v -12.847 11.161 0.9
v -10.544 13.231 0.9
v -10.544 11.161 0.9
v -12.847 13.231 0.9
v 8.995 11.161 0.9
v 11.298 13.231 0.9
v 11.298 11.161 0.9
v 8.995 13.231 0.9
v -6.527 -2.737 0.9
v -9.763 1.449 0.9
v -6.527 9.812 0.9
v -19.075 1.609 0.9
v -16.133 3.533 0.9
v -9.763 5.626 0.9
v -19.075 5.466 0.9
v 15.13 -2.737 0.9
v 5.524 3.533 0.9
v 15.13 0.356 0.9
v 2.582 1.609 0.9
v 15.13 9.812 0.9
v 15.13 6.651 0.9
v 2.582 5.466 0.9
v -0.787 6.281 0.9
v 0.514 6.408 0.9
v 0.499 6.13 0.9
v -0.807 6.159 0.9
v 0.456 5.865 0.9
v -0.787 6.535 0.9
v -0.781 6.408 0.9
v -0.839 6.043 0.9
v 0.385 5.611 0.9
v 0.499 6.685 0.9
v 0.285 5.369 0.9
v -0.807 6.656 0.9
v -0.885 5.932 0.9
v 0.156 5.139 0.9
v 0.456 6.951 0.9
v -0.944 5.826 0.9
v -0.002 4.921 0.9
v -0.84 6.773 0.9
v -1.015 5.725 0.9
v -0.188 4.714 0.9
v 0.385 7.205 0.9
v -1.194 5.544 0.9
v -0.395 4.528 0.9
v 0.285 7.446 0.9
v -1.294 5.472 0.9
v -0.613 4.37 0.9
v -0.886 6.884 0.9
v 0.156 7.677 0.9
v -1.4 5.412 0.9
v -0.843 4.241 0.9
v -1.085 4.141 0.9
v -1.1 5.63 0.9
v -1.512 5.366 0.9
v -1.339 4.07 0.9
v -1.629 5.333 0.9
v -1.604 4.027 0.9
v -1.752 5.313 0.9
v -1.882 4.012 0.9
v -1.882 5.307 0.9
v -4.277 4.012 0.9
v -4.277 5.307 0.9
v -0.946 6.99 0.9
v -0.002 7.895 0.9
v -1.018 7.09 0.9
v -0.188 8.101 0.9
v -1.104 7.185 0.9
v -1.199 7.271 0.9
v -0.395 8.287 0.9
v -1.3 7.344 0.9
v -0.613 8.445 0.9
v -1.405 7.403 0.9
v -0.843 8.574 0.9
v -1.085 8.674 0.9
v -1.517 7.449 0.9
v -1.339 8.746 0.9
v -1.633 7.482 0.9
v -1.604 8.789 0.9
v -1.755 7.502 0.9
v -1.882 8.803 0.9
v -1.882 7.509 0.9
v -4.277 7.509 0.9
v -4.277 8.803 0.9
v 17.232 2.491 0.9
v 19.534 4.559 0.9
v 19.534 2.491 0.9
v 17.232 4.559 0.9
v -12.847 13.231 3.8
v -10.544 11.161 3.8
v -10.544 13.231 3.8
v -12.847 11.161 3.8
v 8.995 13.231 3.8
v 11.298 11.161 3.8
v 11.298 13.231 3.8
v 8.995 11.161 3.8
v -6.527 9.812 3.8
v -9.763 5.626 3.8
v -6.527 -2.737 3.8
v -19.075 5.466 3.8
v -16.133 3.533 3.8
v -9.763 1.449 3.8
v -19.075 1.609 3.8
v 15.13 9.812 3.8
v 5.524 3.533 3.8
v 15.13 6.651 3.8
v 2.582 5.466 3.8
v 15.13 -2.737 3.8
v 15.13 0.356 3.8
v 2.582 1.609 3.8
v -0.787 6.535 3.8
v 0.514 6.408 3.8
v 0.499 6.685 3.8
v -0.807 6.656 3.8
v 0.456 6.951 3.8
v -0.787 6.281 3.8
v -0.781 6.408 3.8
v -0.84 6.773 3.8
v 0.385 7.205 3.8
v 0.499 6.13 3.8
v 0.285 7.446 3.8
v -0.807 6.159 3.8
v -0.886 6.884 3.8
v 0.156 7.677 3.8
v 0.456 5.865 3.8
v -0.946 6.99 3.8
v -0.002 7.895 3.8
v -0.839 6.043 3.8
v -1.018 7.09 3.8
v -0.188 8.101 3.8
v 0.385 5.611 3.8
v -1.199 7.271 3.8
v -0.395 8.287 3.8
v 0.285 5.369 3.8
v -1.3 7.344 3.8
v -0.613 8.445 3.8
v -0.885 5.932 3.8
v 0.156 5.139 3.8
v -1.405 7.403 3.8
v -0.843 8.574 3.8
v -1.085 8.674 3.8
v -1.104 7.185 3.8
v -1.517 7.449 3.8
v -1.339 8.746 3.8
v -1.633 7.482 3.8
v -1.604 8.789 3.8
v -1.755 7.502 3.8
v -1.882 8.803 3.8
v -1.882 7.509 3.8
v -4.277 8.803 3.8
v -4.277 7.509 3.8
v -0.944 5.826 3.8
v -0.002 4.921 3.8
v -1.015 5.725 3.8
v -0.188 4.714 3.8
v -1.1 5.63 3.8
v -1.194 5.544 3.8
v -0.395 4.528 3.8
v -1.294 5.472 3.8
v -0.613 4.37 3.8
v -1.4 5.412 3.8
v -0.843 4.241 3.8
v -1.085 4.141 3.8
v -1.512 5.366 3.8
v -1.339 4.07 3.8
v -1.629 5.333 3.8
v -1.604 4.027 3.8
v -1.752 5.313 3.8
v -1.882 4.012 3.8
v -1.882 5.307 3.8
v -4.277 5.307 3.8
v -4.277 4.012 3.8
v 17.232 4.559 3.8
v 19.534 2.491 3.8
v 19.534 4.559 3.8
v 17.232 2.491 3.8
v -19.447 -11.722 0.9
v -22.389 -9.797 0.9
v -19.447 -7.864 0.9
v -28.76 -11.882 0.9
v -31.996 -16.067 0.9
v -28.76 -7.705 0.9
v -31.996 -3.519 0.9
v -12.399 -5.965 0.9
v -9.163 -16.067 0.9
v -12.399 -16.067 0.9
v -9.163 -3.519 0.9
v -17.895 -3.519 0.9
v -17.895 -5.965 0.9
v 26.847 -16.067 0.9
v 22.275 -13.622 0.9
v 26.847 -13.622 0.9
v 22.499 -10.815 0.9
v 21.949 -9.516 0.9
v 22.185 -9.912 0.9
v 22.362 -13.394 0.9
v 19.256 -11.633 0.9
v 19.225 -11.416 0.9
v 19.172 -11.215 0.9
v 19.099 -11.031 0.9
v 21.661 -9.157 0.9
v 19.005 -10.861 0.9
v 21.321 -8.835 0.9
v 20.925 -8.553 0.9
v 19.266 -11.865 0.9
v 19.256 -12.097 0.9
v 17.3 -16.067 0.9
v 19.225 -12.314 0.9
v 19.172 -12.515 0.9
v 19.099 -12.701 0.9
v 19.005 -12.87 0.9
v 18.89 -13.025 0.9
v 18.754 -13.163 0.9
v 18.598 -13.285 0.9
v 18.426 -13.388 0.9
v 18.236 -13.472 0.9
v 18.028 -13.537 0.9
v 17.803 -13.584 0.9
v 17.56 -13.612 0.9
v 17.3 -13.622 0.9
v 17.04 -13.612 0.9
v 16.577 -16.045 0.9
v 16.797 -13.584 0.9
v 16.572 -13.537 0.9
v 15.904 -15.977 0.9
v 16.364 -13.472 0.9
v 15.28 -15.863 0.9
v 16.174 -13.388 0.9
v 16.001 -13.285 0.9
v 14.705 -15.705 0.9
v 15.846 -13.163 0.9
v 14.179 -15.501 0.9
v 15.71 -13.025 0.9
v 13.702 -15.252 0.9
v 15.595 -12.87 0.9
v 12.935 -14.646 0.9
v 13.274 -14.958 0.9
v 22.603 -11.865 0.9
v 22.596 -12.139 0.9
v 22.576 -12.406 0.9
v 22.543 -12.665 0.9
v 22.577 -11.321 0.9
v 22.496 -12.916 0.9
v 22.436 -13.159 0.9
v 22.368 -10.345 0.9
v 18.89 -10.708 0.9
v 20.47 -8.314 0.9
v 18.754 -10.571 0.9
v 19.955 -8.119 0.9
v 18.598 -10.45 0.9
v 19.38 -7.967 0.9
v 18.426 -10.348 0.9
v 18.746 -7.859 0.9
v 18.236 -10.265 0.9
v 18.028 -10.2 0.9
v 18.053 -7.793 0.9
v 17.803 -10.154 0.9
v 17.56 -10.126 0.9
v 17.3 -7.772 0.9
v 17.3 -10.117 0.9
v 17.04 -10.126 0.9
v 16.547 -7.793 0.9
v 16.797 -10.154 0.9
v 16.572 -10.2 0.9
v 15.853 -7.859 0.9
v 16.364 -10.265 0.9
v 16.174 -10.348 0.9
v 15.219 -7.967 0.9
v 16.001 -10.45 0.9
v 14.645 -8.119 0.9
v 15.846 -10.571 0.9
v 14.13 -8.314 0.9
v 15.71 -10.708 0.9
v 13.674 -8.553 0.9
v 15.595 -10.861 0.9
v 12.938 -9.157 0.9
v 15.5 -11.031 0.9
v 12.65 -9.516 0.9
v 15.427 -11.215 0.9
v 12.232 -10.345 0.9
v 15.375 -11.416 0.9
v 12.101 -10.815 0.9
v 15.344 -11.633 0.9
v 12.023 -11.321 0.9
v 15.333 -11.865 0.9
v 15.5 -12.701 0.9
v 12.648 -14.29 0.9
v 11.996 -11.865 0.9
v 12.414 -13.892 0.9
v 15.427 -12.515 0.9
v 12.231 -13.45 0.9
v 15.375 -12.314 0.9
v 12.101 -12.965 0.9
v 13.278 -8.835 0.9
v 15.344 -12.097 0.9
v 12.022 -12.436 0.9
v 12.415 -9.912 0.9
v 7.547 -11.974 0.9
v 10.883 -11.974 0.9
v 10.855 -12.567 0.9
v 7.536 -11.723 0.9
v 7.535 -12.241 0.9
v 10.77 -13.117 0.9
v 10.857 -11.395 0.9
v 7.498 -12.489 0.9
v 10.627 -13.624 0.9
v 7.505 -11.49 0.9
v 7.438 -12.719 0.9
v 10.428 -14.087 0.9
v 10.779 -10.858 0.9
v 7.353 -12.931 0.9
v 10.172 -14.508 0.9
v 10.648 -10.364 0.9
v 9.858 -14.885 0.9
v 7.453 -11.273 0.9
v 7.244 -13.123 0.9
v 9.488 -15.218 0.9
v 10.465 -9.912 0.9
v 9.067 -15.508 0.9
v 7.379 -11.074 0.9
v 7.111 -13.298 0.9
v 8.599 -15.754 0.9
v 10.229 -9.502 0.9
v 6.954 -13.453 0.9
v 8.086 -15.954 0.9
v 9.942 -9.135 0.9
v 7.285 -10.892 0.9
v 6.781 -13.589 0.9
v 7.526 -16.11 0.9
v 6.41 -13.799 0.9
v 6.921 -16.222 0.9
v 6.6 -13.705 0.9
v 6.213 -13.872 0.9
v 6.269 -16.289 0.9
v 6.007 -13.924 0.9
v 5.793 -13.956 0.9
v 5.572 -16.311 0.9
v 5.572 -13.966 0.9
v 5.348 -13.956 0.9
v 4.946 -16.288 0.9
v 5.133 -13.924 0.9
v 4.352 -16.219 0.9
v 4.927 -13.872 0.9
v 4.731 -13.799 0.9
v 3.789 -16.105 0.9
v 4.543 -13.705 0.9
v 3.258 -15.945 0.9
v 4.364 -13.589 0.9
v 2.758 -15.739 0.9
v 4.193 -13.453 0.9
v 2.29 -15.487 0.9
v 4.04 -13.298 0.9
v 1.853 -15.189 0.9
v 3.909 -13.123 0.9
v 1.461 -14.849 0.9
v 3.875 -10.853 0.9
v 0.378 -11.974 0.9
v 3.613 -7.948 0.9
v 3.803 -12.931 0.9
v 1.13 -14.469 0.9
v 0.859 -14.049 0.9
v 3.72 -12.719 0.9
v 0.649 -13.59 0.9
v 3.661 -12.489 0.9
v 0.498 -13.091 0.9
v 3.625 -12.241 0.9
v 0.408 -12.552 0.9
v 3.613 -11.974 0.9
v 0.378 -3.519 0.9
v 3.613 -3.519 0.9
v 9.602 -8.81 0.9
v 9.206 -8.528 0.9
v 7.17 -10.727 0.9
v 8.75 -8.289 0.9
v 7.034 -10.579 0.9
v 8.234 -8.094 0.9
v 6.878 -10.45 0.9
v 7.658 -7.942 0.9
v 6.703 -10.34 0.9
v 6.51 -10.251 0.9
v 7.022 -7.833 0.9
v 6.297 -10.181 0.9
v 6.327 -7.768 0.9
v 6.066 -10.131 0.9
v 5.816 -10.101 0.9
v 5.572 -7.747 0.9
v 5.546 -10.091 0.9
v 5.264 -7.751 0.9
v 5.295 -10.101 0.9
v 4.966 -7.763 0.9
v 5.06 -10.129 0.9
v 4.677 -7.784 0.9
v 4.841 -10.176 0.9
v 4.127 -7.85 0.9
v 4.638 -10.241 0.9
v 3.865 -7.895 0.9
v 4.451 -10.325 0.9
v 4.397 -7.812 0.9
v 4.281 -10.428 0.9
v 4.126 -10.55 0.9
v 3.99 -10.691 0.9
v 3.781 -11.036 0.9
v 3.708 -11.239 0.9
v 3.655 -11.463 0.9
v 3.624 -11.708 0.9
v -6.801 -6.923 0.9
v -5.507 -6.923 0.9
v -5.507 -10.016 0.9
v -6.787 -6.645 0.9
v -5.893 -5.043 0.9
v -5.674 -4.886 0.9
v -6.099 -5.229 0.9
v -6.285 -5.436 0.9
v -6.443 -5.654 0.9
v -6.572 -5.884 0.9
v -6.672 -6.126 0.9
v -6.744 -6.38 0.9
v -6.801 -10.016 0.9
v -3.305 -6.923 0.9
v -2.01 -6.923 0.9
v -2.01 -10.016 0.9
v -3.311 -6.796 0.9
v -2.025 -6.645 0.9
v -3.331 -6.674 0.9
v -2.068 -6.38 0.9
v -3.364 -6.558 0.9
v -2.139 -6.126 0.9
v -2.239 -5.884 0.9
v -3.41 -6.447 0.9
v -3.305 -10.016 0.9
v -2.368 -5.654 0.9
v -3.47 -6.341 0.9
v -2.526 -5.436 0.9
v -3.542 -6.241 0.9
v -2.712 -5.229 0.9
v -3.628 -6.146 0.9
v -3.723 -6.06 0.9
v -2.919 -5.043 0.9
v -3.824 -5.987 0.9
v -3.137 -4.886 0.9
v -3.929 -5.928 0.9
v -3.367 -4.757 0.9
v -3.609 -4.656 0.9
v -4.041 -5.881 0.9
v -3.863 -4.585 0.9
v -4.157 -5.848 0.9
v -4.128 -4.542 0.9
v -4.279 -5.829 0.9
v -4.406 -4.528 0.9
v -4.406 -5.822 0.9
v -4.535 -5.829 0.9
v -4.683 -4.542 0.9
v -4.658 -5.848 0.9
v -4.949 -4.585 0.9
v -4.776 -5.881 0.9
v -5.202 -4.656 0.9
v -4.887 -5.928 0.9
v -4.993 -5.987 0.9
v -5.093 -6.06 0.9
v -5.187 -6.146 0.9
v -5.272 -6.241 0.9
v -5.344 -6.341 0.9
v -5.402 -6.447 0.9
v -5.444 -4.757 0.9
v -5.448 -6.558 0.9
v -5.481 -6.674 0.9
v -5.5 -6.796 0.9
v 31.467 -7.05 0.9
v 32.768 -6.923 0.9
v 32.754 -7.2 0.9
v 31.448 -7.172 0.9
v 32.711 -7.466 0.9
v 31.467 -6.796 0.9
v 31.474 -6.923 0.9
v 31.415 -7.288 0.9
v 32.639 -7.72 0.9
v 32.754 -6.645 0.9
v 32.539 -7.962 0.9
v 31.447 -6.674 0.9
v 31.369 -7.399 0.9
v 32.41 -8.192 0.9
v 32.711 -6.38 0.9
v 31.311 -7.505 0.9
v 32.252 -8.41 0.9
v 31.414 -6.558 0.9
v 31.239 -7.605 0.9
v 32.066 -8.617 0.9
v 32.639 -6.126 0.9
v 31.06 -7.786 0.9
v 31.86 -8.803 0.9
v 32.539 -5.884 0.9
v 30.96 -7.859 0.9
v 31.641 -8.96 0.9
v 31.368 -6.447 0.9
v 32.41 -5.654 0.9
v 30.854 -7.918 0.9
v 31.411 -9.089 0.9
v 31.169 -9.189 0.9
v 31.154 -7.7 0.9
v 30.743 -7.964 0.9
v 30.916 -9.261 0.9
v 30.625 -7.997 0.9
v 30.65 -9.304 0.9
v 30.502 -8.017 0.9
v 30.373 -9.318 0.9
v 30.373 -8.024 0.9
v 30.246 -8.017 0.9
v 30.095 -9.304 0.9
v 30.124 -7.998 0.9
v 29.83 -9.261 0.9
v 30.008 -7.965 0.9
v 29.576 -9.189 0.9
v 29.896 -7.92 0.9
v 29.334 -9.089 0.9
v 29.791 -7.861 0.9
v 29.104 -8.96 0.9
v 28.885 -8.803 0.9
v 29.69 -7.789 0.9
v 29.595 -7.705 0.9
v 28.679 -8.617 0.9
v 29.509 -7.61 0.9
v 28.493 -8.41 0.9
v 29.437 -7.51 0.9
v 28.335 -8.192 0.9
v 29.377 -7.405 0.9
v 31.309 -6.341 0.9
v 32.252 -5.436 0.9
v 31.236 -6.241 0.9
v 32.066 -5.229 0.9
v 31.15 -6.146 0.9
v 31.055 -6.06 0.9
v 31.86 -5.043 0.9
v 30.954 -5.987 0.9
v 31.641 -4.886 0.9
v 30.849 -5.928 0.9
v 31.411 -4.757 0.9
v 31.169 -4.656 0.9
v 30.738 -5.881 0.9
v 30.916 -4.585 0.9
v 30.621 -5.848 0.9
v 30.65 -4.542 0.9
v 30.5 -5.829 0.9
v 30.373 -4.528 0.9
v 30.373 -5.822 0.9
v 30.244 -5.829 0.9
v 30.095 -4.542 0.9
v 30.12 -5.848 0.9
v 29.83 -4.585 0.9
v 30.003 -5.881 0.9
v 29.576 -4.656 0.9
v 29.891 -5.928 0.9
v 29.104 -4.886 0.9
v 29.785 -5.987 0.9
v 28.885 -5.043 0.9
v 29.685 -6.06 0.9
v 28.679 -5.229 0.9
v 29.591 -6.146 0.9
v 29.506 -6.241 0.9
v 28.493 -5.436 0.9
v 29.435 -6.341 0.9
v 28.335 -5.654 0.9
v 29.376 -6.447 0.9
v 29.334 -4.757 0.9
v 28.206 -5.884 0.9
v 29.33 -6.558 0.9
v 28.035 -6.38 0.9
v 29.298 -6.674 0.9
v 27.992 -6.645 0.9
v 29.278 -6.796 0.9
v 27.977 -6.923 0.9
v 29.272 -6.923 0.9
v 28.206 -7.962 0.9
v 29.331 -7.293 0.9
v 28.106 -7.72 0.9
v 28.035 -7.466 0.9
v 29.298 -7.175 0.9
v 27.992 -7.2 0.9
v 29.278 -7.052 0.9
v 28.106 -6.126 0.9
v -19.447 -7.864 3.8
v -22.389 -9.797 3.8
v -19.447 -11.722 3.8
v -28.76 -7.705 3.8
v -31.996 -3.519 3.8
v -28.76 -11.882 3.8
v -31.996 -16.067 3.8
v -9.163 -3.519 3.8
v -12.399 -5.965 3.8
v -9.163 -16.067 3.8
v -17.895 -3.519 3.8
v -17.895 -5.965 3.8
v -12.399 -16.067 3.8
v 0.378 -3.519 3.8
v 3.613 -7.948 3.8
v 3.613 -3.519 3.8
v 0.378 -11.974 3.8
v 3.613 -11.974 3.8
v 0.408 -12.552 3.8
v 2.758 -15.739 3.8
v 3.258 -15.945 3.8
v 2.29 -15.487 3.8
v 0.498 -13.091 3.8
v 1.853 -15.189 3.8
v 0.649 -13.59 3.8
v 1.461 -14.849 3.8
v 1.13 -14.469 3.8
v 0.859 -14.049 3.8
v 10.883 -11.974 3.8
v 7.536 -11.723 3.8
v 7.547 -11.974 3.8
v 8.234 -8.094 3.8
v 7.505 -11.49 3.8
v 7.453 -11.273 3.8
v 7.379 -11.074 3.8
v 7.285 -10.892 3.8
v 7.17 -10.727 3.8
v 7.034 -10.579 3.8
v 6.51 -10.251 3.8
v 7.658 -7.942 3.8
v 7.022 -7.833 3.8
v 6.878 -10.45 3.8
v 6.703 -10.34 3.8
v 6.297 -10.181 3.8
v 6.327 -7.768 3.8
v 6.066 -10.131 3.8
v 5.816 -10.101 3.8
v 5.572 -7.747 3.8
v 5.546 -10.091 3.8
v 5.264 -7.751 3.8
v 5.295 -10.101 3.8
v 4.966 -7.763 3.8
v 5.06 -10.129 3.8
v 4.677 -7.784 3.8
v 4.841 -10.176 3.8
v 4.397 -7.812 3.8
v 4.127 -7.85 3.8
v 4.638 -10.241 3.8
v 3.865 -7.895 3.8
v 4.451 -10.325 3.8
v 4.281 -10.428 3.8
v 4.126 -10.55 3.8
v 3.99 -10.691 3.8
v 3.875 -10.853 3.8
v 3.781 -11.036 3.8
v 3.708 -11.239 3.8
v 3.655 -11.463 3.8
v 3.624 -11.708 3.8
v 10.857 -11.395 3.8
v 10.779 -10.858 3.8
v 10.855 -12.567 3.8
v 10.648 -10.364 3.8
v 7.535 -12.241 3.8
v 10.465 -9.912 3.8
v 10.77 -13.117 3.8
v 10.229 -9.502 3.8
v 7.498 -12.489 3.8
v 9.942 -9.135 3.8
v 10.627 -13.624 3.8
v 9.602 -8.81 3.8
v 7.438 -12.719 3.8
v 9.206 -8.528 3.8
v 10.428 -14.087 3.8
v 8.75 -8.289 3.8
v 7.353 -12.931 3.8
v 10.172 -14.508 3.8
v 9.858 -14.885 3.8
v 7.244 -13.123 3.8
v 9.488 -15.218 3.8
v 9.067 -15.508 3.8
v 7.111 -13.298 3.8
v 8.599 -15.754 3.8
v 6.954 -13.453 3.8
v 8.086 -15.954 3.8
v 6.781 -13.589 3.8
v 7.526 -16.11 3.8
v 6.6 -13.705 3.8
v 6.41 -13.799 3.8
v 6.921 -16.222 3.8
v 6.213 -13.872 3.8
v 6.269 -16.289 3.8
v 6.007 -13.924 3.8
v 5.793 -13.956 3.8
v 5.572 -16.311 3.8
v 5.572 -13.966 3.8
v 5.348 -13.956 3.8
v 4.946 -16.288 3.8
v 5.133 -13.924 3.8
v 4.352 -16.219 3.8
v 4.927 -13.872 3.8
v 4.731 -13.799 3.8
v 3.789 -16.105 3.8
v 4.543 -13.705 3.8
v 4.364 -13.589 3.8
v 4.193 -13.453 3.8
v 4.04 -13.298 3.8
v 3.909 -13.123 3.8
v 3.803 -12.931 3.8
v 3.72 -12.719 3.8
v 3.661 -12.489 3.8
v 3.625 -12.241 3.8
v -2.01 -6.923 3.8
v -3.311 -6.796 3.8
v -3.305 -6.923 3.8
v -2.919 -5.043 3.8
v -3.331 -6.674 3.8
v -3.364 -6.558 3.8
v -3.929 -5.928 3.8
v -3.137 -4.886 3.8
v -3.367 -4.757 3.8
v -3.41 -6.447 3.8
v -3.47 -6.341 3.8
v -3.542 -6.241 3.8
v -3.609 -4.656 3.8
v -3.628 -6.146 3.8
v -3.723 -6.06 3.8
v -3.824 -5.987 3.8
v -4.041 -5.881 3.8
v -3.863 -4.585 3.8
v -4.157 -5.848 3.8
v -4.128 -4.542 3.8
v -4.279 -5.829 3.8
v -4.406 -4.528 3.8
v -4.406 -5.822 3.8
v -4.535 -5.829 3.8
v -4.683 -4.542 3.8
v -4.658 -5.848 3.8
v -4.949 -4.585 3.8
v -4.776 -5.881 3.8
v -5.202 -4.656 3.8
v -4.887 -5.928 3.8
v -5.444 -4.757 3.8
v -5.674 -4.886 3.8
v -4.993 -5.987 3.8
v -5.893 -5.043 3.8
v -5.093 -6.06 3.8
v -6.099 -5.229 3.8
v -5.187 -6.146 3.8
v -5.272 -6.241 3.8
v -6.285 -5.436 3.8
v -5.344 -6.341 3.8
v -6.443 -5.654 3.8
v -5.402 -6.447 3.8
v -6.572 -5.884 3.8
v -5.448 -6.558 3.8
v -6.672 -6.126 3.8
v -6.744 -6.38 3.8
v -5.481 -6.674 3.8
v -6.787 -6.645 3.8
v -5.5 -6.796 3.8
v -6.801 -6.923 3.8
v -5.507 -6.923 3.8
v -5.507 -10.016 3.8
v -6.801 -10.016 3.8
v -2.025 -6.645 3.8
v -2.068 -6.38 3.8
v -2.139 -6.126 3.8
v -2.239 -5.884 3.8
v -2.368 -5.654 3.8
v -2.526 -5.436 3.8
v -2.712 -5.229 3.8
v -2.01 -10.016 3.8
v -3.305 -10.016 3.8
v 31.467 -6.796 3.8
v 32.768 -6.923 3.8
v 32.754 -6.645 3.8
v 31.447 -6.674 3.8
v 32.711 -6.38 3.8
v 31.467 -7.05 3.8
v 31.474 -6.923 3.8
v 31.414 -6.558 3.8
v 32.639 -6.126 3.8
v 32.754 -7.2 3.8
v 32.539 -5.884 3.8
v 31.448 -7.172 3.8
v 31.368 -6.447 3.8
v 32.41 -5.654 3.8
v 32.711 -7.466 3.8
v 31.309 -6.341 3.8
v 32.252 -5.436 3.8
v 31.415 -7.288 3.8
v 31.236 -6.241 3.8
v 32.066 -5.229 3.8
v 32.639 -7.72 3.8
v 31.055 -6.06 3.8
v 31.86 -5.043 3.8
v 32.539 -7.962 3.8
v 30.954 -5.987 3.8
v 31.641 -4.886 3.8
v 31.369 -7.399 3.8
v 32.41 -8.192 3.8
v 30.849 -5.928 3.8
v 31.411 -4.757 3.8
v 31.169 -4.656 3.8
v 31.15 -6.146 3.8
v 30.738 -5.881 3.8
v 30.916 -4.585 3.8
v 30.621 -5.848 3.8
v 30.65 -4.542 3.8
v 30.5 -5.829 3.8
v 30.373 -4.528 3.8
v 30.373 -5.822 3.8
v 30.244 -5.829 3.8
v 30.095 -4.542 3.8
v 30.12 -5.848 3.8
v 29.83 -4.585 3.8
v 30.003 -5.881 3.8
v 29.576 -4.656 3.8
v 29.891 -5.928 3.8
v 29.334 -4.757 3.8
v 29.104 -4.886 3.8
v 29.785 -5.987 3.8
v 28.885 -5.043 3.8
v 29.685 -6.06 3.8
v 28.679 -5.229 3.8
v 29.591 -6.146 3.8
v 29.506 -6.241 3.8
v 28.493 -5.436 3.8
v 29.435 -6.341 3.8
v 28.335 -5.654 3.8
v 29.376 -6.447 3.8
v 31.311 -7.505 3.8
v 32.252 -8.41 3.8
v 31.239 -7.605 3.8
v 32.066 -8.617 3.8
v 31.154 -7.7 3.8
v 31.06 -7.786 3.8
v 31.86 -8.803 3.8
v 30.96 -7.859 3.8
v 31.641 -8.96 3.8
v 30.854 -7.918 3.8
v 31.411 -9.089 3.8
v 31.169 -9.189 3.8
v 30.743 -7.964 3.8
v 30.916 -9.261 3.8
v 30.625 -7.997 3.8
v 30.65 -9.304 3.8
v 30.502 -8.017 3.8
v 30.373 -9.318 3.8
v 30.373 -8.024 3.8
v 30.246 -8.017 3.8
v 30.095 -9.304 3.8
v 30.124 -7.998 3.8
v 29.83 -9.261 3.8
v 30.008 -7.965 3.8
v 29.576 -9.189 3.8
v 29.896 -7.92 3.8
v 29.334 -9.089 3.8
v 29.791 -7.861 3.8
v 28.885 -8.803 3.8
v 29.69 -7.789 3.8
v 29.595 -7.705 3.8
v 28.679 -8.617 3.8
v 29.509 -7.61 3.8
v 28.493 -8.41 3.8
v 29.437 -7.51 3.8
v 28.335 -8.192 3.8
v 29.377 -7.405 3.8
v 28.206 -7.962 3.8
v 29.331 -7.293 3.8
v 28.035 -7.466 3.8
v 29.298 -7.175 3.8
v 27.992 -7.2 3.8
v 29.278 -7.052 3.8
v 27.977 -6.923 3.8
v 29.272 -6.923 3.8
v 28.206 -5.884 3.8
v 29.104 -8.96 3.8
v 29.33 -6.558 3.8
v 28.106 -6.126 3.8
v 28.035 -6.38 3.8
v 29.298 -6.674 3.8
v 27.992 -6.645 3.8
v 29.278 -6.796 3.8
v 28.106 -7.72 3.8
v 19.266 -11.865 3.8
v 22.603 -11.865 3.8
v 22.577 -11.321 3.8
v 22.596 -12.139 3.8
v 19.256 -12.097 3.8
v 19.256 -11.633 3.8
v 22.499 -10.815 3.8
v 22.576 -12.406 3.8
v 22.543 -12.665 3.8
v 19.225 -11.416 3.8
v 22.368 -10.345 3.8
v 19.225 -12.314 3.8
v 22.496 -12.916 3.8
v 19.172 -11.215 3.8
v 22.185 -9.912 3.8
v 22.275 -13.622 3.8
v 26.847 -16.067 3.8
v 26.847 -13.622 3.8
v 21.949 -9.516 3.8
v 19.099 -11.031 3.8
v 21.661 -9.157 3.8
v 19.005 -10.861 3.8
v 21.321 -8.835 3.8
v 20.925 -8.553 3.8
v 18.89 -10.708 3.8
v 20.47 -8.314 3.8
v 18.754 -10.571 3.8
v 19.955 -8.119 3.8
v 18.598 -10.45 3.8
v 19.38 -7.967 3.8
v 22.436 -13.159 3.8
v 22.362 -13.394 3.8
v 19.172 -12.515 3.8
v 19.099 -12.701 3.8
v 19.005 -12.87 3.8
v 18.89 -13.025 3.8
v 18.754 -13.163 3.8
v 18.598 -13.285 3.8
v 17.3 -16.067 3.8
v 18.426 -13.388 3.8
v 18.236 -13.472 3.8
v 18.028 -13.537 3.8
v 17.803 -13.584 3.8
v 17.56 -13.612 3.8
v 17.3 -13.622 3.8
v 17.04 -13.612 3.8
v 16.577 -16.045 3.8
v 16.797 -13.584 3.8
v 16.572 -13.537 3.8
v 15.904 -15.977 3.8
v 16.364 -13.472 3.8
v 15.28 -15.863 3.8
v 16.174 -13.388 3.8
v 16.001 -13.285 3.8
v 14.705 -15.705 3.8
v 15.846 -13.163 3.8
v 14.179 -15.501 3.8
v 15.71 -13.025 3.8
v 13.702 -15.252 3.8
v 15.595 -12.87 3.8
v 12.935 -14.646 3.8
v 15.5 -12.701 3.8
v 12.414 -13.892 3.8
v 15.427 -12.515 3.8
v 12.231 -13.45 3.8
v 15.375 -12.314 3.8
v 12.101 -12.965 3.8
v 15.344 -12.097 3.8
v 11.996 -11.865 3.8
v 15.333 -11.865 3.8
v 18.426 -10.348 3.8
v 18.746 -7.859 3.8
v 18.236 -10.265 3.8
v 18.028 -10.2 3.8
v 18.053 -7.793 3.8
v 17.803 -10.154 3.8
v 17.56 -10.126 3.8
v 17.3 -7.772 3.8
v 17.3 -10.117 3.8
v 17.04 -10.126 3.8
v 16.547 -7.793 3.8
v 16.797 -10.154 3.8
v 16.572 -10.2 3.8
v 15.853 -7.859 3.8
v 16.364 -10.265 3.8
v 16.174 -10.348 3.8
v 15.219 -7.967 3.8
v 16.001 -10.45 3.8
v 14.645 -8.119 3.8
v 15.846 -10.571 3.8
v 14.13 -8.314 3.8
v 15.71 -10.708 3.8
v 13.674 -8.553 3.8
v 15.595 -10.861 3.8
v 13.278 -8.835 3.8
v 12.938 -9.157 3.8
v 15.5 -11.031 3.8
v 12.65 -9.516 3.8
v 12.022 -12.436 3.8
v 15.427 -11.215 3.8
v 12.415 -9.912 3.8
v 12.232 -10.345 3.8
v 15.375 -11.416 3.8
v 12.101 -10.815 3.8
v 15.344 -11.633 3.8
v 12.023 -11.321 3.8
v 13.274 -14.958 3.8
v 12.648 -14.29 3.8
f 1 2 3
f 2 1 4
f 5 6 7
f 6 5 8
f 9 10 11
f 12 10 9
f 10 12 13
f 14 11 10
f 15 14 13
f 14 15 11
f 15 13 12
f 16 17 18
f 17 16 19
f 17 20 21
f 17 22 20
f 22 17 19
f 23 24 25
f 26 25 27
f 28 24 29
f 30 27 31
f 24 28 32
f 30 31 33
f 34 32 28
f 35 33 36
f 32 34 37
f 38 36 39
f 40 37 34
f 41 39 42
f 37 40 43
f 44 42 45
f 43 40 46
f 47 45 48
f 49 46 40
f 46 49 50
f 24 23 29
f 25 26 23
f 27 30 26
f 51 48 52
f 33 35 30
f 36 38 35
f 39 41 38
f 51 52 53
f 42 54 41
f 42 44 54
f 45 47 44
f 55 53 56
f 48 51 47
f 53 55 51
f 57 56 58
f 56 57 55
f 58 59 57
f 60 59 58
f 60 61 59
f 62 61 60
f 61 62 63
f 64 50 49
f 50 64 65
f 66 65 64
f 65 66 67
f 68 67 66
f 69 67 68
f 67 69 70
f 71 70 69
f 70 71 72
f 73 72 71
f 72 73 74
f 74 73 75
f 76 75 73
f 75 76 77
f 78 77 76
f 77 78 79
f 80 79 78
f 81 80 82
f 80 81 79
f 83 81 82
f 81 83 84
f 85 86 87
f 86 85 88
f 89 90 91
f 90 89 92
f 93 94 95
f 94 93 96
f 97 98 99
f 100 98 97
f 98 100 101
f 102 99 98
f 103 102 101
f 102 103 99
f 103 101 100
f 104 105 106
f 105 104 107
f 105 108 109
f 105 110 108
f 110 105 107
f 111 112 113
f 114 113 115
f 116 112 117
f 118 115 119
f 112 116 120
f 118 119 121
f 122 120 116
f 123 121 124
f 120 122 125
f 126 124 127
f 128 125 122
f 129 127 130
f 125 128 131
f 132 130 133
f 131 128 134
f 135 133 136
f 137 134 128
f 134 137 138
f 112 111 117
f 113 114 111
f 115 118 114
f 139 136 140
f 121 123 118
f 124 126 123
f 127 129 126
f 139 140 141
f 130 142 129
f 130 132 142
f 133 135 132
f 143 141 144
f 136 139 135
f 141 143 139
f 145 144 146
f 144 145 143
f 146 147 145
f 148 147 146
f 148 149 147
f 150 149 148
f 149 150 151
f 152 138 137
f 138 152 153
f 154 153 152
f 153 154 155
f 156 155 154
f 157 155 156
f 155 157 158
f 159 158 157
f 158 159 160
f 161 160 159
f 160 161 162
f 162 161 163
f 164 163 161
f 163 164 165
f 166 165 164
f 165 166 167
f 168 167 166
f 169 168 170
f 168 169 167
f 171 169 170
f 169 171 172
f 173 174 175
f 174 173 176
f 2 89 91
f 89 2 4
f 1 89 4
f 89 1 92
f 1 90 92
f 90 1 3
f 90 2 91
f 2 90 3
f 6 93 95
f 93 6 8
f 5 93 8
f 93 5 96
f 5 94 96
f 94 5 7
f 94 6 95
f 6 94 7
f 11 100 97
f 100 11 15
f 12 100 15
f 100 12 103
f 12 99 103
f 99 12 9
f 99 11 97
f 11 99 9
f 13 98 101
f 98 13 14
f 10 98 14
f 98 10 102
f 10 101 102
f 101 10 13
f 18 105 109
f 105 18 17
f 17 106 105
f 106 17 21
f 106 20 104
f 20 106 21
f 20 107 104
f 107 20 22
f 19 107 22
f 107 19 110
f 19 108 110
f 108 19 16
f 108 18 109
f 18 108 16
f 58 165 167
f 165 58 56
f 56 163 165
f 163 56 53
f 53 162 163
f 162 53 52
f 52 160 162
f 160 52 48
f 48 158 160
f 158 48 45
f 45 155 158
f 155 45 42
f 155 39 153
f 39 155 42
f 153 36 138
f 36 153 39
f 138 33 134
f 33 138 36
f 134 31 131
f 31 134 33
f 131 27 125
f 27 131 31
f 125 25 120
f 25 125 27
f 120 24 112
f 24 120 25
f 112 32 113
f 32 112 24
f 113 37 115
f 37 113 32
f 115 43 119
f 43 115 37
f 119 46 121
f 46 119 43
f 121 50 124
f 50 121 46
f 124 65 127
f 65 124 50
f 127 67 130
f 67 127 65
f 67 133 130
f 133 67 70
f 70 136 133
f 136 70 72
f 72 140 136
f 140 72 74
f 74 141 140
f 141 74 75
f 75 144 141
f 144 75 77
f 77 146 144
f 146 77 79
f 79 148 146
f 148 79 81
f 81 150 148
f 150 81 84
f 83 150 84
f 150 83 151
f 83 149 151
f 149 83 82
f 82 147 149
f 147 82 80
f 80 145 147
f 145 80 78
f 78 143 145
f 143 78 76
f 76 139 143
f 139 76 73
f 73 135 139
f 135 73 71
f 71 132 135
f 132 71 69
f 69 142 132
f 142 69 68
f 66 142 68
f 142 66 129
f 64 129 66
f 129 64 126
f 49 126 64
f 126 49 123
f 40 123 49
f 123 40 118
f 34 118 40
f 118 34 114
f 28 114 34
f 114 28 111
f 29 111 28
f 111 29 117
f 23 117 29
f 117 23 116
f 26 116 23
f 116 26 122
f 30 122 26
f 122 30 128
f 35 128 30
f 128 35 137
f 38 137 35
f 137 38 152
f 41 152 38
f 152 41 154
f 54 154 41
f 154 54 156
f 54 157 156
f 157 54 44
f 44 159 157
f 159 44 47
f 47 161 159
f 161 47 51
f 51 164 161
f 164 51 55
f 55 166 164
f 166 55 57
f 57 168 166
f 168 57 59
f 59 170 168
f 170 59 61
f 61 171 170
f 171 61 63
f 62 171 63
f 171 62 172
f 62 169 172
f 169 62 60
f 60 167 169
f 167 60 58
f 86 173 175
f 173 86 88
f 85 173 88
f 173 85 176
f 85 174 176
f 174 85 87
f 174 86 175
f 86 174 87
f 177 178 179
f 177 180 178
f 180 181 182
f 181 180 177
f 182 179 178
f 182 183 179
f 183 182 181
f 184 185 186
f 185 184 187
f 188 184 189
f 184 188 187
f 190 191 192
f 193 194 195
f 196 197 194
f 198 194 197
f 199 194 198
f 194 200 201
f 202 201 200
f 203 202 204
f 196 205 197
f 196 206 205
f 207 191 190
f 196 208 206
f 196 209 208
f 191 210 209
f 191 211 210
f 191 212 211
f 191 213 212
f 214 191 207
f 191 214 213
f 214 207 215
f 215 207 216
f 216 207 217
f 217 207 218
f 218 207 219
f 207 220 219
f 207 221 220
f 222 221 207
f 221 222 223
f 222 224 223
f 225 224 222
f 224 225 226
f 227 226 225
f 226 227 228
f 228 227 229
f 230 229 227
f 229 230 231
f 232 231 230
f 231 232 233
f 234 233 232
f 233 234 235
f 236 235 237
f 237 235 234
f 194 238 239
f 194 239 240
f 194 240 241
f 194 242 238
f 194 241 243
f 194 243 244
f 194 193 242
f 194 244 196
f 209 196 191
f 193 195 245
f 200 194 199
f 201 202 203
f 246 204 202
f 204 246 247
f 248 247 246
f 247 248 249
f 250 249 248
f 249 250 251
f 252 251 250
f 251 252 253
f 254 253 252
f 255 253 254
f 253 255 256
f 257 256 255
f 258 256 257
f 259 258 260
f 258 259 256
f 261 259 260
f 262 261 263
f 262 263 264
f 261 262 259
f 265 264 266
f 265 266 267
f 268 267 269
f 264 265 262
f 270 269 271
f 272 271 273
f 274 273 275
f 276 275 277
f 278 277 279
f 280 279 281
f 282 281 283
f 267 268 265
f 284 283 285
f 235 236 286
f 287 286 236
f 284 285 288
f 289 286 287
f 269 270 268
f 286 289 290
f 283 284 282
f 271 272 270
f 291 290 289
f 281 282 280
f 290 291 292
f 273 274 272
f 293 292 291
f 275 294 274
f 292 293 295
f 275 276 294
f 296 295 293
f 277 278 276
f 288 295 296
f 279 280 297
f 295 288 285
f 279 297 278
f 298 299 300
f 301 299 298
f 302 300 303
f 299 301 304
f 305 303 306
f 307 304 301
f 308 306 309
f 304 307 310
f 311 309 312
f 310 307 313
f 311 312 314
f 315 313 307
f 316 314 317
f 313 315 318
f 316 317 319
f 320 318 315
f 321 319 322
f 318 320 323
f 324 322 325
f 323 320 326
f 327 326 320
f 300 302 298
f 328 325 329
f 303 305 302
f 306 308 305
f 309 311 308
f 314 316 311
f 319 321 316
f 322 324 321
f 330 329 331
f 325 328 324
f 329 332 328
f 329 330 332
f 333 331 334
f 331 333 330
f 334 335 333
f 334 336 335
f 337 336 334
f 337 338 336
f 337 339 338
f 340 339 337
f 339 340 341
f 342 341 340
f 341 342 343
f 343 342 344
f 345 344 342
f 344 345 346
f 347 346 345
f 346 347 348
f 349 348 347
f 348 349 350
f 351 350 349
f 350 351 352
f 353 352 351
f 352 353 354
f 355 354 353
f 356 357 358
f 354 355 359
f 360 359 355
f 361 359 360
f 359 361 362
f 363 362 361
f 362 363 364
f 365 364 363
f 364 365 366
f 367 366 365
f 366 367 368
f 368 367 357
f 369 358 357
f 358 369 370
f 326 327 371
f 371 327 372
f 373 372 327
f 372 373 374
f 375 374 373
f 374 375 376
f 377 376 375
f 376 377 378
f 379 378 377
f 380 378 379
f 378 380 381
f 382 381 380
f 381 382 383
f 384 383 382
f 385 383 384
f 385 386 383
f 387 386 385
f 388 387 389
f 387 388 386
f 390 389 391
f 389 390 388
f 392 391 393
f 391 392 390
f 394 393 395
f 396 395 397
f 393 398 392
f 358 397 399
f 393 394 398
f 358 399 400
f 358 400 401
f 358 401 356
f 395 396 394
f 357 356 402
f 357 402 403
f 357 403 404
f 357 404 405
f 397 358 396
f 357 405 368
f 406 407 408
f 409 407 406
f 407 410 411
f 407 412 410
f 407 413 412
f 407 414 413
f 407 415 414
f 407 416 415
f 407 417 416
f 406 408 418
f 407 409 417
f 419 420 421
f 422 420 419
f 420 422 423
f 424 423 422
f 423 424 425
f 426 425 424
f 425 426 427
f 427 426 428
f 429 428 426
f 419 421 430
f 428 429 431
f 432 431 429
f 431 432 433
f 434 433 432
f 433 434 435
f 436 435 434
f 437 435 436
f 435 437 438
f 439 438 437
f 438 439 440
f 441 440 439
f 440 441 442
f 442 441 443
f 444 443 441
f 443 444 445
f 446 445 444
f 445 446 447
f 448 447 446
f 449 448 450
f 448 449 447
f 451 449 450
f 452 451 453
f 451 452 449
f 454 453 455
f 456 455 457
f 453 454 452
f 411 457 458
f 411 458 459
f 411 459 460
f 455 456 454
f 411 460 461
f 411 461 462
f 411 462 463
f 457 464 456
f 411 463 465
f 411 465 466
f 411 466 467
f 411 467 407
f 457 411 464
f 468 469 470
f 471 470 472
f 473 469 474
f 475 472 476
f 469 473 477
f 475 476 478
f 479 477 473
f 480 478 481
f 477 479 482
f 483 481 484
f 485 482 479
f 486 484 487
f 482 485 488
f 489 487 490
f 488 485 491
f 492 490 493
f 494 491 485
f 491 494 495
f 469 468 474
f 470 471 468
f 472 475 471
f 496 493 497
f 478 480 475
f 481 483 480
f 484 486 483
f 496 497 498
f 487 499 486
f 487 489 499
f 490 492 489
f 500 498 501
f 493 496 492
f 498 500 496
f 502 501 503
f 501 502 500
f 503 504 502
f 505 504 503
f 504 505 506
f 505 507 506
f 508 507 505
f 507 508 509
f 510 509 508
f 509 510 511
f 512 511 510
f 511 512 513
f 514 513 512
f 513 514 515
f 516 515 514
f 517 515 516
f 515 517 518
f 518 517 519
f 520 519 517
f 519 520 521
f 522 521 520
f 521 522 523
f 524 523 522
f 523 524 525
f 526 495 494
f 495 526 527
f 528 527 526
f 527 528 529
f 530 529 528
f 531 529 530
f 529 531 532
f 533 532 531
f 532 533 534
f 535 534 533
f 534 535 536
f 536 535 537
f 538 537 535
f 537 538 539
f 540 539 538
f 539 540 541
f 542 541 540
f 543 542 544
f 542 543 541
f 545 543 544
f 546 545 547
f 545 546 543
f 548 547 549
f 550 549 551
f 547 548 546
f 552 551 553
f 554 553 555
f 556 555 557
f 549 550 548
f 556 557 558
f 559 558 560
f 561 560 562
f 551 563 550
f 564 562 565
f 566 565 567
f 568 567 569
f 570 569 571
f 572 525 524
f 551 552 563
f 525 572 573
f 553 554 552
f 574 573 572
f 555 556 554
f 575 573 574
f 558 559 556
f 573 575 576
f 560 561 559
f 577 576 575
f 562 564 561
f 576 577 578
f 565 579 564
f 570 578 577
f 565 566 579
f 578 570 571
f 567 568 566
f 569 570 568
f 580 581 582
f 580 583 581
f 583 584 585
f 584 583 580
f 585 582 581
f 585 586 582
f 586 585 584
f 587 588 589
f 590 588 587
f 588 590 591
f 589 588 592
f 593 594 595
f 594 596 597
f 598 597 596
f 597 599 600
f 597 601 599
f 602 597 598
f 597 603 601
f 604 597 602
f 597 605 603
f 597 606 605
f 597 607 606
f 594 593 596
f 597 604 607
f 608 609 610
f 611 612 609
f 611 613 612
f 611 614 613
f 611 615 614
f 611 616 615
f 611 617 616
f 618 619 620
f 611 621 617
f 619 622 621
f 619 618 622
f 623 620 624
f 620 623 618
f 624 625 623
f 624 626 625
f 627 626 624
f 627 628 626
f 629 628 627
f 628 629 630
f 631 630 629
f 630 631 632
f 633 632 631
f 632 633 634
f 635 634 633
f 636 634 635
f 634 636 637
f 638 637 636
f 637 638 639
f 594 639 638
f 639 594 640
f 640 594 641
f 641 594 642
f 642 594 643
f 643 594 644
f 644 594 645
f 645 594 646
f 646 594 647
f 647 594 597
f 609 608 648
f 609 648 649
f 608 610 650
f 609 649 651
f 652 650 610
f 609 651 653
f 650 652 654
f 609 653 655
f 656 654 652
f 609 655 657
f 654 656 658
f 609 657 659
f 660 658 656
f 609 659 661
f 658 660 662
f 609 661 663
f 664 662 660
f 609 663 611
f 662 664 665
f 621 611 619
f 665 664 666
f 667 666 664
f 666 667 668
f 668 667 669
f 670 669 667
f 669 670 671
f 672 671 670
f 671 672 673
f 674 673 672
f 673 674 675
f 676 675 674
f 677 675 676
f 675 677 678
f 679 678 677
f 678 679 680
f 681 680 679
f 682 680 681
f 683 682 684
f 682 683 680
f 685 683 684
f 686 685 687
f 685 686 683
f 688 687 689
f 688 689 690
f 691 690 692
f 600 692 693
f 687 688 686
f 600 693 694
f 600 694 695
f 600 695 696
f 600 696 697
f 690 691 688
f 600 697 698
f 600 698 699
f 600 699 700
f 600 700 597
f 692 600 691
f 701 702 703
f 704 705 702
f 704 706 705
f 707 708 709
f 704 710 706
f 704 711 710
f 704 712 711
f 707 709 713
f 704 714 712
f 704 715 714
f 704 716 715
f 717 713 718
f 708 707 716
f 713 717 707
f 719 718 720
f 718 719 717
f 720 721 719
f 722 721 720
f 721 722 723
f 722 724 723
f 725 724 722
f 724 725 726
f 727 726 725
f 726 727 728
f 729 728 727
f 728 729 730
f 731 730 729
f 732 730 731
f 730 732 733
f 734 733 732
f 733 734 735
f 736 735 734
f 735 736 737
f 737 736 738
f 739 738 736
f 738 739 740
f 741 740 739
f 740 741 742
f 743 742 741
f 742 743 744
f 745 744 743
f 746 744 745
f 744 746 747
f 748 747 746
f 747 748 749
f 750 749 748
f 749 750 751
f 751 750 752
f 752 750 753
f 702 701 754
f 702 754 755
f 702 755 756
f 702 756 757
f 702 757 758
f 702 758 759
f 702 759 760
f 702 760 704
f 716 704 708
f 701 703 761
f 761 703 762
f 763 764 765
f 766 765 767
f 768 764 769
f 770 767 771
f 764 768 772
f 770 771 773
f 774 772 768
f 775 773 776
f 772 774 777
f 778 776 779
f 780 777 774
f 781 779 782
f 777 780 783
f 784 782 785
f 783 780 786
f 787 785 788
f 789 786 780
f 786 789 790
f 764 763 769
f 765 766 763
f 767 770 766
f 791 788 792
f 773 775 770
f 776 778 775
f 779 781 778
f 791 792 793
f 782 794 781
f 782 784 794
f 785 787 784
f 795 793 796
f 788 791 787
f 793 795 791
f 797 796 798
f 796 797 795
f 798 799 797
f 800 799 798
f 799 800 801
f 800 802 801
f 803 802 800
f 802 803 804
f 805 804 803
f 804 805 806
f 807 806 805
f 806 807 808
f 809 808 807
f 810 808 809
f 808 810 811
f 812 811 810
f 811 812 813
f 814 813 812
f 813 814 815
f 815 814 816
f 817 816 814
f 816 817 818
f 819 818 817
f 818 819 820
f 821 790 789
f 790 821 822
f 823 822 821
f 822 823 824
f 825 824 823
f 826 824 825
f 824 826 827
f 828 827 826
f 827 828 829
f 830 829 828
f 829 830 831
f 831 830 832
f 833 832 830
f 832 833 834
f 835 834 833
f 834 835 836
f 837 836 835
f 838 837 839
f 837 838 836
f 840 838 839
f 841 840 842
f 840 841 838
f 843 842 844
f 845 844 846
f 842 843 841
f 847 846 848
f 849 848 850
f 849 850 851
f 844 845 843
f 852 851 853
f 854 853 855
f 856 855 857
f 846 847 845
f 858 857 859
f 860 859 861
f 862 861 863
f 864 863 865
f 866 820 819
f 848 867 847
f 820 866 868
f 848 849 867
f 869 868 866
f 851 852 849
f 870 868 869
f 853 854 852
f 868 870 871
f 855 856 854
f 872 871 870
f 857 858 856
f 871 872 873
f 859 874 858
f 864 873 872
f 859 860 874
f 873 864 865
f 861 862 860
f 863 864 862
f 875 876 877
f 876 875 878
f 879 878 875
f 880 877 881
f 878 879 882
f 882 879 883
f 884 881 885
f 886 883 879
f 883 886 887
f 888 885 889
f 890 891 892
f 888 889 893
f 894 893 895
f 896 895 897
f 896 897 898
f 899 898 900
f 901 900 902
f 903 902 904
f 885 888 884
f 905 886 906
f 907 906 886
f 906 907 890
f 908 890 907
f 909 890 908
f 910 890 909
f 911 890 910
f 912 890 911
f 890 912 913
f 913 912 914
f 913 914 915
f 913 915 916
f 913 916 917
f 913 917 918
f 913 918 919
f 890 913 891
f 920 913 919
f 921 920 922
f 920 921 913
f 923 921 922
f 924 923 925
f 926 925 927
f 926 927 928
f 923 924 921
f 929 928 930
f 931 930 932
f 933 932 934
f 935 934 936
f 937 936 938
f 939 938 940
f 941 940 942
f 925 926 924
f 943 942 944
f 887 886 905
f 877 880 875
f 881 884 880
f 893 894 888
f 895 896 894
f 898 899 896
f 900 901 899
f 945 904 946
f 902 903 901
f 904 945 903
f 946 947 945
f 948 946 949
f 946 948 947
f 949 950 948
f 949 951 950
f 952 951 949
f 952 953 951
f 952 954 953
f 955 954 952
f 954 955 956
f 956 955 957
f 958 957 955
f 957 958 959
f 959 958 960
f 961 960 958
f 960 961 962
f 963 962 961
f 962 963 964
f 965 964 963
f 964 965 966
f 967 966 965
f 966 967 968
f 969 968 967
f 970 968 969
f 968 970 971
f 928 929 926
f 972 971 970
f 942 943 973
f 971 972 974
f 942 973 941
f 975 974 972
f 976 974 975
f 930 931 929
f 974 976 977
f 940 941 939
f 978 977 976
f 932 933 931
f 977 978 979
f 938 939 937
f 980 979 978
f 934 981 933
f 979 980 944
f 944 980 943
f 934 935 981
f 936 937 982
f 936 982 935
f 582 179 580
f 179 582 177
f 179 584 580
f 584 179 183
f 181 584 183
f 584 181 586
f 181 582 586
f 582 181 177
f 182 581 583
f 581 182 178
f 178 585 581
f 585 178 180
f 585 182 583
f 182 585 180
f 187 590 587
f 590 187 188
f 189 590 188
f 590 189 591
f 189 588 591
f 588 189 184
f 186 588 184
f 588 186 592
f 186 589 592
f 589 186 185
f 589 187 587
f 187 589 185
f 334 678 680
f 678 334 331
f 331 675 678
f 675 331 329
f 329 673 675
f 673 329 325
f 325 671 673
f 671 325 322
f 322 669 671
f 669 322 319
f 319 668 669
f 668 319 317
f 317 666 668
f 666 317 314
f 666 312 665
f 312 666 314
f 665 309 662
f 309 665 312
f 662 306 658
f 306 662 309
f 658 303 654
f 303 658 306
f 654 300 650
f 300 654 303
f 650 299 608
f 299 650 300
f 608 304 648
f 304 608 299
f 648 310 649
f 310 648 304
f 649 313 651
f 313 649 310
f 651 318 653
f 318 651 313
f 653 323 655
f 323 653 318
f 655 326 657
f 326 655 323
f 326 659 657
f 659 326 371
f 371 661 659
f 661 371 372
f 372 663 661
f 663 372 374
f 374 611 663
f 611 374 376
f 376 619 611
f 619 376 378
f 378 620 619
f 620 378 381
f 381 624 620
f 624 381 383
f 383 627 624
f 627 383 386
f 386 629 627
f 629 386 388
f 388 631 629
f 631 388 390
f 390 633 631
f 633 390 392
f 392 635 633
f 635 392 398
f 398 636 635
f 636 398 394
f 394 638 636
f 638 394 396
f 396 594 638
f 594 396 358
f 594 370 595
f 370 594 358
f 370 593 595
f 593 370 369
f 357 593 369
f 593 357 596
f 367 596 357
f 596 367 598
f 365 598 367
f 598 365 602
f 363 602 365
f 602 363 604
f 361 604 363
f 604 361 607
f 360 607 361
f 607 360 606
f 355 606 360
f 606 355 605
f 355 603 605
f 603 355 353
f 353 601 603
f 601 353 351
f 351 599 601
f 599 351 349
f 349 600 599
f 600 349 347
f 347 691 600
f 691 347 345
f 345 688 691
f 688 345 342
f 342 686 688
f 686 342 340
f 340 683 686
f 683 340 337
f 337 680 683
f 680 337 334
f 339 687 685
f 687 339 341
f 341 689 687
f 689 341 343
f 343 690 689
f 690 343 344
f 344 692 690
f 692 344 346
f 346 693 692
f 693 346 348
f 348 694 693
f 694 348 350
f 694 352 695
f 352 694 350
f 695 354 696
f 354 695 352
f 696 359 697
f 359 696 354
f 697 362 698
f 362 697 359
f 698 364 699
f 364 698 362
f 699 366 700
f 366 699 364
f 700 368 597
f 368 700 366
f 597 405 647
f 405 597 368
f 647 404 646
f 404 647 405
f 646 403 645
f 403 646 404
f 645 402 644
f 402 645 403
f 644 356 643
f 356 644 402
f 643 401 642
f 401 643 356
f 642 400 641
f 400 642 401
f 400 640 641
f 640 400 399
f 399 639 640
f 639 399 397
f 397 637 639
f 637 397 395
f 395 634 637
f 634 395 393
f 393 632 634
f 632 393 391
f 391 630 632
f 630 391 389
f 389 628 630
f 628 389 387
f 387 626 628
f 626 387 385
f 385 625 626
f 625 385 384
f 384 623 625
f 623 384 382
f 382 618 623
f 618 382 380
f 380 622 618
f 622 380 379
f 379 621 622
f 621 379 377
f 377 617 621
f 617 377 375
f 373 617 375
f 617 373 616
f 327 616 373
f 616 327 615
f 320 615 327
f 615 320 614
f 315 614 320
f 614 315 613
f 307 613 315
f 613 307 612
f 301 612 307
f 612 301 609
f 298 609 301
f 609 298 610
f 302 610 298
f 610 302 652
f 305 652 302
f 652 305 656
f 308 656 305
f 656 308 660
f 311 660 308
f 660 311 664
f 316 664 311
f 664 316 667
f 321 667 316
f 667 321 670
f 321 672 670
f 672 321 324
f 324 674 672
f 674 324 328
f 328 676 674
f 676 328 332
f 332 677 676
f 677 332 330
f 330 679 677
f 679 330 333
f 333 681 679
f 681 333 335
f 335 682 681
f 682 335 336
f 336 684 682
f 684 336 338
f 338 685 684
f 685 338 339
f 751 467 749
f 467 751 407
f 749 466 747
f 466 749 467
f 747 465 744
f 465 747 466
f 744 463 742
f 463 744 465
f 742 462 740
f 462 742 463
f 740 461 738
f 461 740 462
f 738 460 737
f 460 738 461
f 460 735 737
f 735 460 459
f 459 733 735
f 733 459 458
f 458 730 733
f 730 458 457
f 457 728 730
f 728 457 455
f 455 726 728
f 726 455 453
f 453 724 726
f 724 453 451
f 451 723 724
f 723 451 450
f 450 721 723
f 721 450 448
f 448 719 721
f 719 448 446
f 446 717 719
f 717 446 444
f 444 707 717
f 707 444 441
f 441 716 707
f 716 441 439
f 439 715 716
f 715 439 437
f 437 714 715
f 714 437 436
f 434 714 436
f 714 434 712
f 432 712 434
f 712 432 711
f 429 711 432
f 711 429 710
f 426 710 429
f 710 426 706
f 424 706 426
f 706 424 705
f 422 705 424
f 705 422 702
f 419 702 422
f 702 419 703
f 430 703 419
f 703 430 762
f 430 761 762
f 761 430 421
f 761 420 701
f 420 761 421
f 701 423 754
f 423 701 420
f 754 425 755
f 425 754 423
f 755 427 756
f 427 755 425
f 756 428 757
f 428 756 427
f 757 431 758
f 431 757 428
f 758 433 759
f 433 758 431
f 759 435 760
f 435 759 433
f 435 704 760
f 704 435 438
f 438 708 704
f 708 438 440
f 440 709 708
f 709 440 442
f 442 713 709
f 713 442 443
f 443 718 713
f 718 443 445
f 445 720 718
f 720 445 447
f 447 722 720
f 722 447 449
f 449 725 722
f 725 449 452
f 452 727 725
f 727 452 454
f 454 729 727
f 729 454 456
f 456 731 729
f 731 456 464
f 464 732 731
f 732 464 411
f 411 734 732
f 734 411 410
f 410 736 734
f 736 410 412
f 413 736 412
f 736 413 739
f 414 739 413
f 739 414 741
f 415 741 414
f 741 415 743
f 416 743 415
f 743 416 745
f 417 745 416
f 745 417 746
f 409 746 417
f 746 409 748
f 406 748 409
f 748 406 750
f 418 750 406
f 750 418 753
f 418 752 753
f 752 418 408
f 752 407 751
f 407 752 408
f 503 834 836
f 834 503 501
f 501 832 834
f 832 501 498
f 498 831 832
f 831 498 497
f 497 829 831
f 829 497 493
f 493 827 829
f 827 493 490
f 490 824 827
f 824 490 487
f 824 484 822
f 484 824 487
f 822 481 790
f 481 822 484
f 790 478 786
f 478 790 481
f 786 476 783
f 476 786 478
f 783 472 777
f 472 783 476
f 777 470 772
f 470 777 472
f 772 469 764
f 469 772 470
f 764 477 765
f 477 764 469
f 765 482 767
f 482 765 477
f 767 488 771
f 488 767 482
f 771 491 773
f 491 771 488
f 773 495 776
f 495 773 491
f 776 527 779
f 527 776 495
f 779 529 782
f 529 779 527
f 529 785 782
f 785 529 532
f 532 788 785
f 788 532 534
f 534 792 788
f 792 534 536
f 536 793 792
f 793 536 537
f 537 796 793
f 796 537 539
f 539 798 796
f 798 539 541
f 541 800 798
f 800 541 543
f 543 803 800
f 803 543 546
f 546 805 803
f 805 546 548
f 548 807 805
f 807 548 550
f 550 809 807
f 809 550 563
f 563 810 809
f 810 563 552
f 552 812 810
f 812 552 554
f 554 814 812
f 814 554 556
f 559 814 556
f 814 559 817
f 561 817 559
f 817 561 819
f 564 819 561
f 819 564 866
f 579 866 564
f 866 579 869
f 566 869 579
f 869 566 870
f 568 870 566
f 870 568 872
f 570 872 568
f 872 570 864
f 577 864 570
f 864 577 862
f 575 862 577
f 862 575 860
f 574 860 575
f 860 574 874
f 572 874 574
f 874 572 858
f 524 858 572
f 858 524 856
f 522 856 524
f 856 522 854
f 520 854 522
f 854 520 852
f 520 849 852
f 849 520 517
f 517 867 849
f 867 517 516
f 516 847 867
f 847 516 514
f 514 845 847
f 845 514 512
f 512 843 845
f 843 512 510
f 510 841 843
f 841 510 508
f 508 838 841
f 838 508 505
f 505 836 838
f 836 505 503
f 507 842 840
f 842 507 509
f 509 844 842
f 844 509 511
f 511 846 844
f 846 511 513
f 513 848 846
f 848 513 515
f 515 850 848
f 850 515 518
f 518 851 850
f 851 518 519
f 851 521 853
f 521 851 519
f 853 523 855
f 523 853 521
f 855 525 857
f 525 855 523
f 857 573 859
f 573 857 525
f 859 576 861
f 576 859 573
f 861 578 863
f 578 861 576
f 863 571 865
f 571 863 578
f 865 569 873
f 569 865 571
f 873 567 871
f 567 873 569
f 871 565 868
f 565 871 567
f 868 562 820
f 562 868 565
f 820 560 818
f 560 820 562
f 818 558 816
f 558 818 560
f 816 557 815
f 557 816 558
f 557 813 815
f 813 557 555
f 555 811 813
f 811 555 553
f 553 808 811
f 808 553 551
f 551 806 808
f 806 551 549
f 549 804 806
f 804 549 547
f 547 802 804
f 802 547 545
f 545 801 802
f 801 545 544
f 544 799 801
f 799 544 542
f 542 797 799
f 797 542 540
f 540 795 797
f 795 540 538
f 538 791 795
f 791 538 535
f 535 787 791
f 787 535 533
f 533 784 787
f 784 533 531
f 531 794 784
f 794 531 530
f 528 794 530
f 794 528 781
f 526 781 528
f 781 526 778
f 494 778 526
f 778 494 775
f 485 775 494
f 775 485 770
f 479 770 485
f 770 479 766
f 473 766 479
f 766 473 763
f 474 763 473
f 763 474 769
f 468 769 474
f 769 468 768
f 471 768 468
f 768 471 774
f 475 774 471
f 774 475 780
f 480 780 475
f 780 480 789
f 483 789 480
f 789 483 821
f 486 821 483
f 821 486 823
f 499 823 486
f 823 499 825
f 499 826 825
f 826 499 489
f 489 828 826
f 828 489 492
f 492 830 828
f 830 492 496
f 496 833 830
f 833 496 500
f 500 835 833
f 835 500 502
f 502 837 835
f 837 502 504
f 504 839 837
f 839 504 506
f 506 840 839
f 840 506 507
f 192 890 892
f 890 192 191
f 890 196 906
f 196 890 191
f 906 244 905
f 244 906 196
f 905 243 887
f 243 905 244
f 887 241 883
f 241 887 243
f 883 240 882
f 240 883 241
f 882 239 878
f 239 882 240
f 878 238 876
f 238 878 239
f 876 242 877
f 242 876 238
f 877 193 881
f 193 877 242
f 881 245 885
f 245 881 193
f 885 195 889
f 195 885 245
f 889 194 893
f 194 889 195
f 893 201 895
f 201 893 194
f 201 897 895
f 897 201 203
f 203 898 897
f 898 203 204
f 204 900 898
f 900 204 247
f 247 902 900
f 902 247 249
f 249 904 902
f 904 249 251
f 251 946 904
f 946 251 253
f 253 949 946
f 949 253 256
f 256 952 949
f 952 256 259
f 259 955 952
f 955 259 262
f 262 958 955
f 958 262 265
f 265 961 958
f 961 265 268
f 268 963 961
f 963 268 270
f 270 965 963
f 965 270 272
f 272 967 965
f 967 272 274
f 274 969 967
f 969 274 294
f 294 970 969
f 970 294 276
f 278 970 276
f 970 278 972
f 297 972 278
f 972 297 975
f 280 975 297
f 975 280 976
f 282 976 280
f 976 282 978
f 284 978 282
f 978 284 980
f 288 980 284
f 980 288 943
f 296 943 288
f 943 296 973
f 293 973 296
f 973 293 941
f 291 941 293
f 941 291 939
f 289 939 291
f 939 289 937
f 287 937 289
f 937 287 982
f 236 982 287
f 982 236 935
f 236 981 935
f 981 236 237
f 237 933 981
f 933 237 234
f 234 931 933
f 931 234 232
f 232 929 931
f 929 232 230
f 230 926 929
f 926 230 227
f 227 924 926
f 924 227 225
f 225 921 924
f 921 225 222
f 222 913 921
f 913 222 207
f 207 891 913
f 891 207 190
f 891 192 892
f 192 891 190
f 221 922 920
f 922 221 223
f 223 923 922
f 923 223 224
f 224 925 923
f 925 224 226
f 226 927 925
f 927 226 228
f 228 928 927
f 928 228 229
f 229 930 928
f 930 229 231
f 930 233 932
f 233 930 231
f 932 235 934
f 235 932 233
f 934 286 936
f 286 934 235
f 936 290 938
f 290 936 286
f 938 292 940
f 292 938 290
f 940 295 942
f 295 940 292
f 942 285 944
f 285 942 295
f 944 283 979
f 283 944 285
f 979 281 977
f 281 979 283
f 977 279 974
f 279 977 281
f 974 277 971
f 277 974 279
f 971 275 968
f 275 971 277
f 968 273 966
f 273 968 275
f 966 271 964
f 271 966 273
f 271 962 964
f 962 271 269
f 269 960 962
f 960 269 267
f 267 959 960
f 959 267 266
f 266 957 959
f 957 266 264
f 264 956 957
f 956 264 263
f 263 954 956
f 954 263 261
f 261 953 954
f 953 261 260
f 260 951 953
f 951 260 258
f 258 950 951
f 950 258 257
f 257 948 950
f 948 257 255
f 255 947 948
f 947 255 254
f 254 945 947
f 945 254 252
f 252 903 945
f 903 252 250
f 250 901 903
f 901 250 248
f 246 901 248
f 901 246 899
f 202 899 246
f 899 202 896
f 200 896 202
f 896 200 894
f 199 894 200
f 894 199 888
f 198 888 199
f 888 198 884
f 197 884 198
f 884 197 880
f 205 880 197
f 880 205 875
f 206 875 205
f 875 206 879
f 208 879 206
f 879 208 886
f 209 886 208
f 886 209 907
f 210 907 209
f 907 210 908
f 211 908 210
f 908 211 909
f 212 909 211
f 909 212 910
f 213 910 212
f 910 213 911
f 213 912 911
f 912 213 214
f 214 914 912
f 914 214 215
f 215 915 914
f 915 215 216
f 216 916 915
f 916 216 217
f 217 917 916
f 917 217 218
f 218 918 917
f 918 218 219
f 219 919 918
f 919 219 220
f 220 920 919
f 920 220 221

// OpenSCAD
$fn = 48;
  // syllabics (overlaid on icon, tallest)
  translate([0, 5.060, 0.900]) linear_extrude(height=2.900) text("ᐋᐣᑇ", size=12.394, halign="center", valign="center", font="Euphemia UCAS:style=Bold");
  translate([0, -10.060, 0.900]) linear_extrude(height=2.900) text("ᐅᒣᐢᑲᓇᐤ", size=12.394, halign="center", valign="center", font="Euphemia UCAS:style=Bold");
